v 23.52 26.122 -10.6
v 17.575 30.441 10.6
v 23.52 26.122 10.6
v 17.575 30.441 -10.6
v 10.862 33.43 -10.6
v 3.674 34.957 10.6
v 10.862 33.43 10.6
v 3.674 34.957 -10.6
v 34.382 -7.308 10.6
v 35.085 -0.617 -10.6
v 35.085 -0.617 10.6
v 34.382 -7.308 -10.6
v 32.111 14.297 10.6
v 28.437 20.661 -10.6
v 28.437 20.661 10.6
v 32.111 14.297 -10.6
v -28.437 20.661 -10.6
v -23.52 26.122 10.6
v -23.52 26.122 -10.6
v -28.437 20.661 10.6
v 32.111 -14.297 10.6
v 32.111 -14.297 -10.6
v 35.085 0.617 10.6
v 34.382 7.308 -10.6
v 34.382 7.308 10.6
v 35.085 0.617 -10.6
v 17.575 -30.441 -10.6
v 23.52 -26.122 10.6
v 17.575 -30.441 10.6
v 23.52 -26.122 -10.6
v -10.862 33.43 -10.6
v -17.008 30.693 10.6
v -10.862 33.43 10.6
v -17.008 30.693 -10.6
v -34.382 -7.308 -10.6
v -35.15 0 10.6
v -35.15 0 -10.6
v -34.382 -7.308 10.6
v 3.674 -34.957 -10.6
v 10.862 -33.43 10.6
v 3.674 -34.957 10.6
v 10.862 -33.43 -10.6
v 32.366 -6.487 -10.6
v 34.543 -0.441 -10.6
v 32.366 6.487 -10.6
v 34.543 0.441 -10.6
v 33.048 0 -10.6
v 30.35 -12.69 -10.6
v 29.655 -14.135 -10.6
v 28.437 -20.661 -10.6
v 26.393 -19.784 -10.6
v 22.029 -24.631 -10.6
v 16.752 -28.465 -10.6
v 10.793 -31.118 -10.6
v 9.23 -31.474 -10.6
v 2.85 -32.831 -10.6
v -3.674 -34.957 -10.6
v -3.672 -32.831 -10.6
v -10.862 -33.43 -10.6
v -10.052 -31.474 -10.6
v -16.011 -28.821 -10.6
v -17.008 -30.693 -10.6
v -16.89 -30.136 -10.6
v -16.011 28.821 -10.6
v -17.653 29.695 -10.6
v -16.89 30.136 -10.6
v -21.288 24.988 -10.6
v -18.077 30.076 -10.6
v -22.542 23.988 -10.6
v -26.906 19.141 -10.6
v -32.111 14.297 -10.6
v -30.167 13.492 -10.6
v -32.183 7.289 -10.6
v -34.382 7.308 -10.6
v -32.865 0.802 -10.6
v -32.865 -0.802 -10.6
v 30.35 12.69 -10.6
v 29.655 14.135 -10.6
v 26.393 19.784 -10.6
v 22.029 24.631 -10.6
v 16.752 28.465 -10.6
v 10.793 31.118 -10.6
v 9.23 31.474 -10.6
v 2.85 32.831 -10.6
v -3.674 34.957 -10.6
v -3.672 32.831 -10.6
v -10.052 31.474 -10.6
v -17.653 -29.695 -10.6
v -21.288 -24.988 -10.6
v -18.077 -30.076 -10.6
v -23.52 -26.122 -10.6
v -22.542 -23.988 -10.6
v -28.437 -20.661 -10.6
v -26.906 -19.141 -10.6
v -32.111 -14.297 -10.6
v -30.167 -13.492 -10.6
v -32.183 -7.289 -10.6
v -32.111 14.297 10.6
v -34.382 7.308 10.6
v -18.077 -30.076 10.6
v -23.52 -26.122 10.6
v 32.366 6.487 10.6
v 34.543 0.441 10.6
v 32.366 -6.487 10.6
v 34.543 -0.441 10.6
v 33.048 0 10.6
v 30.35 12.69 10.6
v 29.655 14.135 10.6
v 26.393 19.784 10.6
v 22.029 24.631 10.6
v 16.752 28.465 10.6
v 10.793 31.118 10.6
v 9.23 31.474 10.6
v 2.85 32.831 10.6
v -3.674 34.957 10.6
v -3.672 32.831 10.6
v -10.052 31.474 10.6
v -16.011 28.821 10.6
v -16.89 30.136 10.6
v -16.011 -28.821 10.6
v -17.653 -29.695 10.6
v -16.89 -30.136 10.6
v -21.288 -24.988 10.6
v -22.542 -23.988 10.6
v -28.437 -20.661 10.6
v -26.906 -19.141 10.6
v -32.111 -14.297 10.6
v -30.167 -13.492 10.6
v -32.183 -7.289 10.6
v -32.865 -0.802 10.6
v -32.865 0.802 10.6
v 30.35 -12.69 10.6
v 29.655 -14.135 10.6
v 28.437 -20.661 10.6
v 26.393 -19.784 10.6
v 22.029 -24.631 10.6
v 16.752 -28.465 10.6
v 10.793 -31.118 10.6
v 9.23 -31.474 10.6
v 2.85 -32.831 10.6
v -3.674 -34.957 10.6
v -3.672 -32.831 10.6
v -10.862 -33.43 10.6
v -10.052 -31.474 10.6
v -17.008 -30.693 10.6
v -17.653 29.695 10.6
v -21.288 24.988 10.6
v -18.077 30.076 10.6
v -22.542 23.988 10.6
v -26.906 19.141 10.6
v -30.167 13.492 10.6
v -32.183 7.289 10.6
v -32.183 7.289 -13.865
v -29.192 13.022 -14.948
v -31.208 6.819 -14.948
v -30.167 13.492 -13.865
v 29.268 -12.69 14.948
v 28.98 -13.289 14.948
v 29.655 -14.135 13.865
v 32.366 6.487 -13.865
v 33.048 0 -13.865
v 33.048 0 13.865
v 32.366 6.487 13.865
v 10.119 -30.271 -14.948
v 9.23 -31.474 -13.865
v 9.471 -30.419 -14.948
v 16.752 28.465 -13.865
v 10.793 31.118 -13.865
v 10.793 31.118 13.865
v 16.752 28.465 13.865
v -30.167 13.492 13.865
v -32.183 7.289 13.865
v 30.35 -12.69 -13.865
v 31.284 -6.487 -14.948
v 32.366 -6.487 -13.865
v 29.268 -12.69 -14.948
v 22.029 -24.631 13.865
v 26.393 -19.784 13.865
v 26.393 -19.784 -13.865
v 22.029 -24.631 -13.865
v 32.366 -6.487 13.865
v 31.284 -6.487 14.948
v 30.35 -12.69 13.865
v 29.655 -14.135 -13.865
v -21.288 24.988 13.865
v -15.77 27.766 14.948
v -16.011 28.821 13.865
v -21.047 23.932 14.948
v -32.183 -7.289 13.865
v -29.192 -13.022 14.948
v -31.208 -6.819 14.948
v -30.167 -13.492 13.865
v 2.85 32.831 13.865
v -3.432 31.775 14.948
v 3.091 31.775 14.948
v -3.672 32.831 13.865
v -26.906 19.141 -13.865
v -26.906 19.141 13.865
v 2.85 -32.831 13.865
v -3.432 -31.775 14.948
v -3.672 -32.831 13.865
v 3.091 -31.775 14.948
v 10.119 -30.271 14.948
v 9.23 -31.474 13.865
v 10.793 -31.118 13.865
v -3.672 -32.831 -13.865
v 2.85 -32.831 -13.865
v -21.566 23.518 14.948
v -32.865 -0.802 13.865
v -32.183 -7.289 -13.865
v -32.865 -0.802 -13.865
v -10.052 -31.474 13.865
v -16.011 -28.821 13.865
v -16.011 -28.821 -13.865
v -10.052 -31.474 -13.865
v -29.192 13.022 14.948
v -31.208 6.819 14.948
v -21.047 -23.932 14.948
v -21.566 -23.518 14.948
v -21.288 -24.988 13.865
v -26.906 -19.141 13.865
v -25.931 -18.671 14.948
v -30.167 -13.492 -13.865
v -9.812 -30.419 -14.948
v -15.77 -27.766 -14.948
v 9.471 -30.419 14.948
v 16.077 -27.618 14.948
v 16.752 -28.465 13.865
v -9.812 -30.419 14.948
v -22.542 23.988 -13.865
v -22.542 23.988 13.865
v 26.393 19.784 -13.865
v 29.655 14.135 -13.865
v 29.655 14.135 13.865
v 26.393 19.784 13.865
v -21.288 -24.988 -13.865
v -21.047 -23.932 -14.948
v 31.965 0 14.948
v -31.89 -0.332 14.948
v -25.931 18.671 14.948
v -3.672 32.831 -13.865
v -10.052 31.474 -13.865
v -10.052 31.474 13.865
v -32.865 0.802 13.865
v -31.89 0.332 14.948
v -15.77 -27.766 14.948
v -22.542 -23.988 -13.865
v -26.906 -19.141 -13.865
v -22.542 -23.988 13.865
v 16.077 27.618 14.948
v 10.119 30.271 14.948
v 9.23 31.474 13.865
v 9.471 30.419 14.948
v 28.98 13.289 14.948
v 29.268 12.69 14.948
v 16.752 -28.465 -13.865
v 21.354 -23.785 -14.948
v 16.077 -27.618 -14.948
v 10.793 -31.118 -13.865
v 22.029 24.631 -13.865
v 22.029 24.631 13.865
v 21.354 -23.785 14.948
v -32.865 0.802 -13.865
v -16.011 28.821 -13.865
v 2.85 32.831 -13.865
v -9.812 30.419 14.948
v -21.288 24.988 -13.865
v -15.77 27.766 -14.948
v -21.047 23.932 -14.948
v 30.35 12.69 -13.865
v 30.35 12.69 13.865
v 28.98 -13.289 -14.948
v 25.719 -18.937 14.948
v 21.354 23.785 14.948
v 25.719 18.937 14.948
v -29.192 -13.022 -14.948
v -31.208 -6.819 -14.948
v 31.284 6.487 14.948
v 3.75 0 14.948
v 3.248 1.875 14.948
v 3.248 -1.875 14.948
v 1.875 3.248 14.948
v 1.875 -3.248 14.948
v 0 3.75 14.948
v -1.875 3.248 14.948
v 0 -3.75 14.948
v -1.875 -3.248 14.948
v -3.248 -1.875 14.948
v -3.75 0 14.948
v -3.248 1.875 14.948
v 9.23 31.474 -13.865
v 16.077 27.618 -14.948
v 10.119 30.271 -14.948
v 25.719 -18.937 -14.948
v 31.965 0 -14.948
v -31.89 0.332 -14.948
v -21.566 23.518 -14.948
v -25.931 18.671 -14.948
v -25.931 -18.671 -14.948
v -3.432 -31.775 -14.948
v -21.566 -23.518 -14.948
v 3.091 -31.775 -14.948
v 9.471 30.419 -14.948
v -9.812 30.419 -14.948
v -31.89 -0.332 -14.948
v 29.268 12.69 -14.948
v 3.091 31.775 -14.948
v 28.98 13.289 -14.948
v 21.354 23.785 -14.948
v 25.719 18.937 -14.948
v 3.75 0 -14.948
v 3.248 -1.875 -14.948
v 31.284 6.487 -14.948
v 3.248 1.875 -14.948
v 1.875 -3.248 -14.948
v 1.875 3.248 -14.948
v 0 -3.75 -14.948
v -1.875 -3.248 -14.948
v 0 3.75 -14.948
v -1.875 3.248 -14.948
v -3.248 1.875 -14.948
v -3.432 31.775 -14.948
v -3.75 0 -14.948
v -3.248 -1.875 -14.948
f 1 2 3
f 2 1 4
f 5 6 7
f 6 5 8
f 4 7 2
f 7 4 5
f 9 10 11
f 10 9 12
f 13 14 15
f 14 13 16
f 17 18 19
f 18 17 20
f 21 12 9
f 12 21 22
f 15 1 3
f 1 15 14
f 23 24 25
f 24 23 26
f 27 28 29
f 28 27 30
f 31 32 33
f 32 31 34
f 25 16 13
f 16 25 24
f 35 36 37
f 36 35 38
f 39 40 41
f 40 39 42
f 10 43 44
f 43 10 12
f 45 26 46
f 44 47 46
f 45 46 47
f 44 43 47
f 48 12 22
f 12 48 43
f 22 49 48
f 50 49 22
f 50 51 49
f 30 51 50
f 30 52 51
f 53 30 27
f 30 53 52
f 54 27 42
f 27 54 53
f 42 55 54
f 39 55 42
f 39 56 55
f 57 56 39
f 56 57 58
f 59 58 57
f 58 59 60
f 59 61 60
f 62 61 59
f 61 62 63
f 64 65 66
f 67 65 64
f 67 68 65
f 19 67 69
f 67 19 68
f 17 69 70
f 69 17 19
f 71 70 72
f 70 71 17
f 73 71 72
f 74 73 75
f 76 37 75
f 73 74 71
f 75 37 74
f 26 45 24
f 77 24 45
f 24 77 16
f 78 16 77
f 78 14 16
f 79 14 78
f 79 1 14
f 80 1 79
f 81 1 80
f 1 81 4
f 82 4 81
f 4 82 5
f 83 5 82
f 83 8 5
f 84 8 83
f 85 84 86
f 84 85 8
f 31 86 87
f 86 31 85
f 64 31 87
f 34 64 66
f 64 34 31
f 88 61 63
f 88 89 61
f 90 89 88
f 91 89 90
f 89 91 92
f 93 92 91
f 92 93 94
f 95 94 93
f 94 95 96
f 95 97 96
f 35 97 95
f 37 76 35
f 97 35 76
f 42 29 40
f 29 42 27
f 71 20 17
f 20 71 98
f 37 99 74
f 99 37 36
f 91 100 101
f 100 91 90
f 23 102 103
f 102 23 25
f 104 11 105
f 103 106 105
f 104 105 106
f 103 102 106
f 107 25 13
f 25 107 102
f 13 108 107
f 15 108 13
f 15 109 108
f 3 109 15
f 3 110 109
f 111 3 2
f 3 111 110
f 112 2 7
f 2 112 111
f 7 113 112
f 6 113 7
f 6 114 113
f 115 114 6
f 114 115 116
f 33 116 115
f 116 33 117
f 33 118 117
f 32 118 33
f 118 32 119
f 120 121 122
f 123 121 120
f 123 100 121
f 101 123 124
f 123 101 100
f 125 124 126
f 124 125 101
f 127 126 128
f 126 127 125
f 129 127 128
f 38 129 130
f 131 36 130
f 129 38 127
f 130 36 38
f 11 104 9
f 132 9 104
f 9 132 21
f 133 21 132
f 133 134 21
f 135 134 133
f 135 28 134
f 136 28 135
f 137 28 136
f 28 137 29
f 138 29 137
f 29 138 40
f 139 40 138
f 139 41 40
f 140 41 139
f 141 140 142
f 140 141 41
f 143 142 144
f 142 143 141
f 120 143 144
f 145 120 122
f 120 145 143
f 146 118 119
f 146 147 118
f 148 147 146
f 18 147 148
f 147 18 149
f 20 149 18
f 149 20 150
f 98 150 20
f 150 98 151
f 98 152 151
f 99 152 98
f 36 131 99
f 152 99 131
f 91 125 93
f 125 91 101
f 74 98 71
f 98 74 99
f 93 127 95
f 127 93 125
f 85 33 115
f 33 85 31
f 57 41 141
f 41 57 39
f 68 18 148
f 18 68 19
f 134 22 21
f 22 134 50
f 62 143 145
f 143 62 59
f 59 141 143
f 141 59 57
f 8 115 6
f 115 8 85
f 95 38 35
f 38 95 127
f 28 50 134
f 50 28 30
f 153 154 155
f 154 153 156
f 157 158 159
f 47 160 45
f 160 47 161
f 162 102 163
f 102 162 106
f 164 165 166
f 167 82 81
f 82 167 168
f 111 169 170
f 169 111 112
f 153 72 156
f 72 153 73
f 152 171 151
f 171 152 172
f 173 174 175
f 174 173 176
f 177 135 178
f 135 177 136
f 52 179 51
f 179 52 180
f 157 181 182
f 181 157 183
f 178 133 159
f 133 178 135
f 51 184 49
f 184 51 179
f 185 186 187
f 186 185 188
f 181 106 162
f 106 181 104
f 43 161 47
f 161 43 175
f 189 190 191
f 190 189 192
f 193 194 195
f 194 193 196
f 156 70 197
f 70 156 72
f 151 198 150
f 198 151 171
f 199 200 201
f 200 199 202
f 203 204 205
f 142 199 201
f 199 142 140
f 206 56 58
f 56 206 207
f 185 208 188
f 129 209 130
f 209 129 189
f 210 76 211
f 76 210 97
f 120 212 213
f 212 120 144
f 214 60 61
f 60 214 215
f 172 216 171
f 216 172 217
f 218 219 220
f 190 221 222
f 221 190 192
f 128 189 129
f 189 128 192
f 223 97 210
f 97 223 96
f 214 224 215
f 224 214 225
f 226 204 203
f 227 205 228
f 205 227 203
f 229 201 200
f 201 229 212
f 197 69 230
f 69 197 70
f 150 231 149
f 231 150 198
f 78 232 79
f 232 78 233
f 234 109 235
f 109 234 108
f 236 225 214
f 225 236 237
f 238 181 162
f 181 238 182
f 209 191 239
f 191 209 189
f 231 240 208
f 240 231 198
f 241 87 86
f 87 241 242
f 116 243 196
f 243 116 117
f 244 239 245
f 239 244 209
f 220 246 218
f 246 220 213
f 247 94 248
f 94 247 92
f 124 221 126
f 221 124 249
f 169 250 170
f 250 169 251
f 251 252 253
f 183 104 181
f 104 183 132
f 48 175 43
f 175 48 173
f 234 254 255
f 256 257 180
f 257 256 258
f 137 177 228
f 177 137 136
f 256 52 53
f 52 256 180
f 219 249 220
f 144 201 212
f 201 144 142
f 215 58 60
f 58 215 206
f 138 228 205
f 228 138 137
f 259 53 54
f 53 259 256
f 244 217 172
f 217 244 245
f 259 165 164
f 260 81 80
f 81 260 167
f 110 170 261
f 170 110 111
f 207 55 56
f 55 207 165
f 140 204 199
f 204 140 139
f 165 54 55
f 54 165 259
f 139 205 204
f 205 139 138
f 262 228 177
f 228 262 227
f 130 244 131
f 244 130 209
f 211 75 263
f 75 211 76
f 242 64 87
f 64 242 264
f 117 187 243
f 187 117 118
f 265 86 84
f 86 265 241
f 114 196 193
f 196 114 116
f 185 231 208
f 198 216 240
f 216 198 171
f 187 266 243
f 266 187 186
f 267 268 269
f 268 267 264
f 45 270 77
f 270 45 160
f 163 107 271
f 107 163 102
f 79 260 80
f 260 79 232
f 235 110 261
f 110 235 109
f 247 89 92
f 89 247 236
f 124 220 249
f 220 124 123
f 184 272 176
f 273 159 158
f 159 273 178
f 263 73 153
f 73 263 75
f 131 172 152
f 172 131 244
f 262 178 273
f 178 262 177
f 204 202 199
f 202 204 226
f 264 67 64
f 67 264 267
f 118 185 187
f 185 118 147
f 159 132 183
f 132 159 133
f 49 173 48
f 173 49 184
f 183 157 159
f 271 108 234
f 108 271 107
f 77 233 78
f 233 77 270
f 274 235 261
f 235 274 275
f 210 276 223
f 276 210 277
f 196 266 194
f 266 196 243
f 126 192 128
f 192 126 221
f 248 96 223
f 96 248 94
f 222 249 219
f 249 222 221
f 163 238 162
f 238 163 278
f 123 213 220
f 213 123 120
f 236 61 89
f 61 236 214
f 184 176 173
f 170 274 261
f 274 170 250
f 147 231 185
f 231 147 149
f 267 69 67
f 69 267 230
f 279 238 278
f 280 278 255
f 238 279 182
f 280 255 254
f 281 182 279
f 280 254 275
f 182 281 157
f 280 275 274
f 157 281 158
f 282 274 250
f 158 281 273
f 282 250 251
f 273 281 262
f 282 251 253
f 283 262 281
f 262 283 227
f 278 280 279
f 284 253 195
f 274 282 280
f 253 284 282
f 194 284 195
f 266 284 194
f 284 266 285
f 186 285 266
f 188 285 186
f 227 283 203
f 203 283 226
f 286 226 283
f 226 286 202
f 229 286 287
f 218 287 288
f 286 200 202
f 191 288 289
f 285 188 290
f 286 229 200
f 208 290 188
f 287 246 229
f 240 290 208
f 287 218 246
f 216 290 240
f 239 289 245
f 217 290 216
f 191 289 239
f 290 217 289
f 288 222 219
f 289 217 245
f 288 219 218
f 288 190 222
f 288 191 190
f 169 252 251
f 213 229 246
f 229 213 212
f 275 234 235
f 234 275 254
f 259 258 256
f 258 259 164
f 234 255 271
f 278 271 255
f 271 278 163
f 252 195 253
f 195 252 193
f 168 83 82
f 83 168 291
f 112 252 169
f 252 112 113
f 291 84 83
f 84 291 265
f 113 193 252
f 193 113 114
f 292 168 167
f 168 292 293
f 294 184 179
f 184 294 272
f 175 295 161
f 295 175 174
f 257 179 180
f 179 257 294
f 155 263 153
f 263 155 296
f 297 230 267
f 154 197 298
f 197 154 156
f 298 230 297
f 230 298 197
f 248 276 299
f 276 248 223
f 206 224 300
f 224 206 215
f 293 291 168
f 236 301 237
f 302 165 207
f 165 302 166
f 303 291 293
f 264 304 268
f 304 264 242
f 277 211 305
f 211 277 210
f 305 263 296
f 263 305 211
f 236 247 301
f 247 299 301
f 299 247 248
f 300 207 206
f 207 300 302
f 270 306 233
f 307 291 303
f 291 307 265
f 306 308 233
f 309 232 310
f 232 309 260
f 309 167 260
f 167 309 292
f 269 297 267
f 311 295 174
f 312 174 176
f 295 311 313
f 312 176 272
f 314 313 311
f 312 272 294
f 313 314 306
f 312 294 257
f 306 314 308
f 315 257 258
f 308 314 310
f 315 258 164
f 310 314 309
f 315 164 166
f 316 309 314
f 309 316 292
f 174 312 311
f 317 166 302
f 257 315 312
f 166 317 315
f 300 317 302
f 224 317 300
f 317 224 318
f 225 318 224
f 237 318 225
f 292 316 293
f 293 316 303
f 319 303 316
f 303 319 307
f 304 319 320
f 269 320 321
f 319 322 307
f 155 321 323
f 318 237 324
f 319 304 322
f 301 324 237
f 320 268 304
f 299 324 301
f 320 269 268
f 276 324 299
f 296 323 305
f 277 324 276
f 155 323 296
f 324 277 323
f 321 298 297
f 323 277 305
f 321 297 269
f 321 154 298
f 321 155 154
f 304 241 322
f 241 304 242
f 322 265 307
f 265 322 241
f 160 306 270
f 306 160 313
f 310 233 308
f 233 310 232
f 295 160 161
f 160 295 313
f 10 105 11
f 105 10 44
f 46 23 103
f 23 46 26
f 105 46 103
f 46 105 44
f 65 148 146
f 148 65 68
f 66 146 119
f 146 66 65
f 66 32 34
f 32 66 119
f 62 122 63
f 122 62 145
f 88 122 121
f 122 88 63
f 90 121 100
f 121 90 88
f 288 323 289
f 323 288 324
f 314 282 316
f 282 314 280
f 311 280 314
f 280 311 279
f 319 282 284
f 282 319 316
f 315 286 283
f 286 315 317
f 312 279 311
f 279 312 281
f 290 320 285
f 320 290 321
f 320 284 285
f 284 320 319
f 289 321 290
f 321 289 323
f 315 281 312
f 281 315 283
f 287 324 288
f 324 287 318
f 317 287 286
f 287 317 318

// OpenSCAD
puck_lead_core(bevel = false, core_version = 1);


core_measures = [ //max_diameter, middle_height, inner_diameter, hole_diameter
                    [ 74,   21.4,   63.6 , 7.5],  // SIMMS V1
                    [ 72.3, 21.2,   64.4 , 7.5],  // SIMMS V2
                   ];
                    
function LEAD_CORE_SIMMS_V1() = 0;
function LEAD_CORE_SIMMS_V2() = 1;
/*  
//SIM V1
function lead_core_max_diameter() = 74;
function lead_core_middle_height() = 21.4;
function lead_core_inner_diameter() = 63.6;;

//SIM V2
function lead_core_max_diameter() = 72.3;
function lead_core_middle_height() = 21.2;
function lead_core_inner_diameter() = 64.4;
*/
function lead_core_max_diameter(version) = core_measures[version][0];
function lead_core_max_radius(version) = core_measures[version][0]/2;

function lead_core_middle_height(version) =  core_measures[version][1];

function lead_core_inner_diameter(version) =  core_measures[version][2];
function lead_core_inner_radius(version) =  core_measures[version][2]/2;

function lead_core_hole_diameter(version) =  core_measures[version][3];
function lead_core_hole_radius(version) =  core_measures[version][3]/2;

//lead core, 1 piece
module puck_lead_core( offset_tolerance = 0, bevel = true, core_version = LEAD_CORE_SIMMS_V2()  ) {

    core_rounded_radius = 1;
    core_outer_diameter = lead_core_max_diameter( core_version ) - 2*core_rounded_radius + offset_tolerance;
    core_inner_diameter = lead_core_inner_diameter( core_version ) - 2*core_rounded_radius + offset_tolerance;
    core_bevel_diameter = 50 - 2*core_rounded_radius + offset_tolerance;
    core_total_height   = 28.2 - 2*core_rounded_radius + offset_tolerance;
    core_beveled_height = 27 - 2*core_rounded_radius + offset_tolerance;
    core_middle_height  = lead_core_middle_height( core_version ) + offset_tolerance;
    core_central_hole_diameter = lead_core_hole_diameter( core_version ) - offset_tolerance;
    core_edge_locks_diameter = 1.5 + offset_tolerance;

    difference(){
        union(){    
            cylinder(r = core_outer_diameter/2, h = core_middle_height, center =true);
            minkowski() {
                if ( bevel==true ) {
                    union() {
                        cylinder(r = core_inner_diameter/2, h = core_beveled_height, center =true);
                        translate([0,0, core_beveled_height/2])  cylinder(r1 = core_inner_diameter/2, r2=core_bevel_diameter/2, h = (core_total_height-core_beveled_height)/2);
                        translate([0,0,-core_total_height/2])   cylinder(r2 = core_inner_diameter/2, r1=core_bevel_diameter/2, h = (core_total_height-core_beveled_height)/2);
                    }
                }
                else
                {
                    cylinder(r = core_inner_diameter/2, h = core_total_height, center =true);
                }
                sphere(r=2*core_rounded_radius);        
            }
        }
        cylinder(r=core_central_hole_diameter/2, h = 2*core_total_height, center=true);
        
        for (i = [0,120,240]) {
                rotate(i) translate([core_outer_diameter/2,0,0]) cylinder(r=core_edge_locks_diameter/2, h = core_total_height, center=true);
            }
        
    }
}
